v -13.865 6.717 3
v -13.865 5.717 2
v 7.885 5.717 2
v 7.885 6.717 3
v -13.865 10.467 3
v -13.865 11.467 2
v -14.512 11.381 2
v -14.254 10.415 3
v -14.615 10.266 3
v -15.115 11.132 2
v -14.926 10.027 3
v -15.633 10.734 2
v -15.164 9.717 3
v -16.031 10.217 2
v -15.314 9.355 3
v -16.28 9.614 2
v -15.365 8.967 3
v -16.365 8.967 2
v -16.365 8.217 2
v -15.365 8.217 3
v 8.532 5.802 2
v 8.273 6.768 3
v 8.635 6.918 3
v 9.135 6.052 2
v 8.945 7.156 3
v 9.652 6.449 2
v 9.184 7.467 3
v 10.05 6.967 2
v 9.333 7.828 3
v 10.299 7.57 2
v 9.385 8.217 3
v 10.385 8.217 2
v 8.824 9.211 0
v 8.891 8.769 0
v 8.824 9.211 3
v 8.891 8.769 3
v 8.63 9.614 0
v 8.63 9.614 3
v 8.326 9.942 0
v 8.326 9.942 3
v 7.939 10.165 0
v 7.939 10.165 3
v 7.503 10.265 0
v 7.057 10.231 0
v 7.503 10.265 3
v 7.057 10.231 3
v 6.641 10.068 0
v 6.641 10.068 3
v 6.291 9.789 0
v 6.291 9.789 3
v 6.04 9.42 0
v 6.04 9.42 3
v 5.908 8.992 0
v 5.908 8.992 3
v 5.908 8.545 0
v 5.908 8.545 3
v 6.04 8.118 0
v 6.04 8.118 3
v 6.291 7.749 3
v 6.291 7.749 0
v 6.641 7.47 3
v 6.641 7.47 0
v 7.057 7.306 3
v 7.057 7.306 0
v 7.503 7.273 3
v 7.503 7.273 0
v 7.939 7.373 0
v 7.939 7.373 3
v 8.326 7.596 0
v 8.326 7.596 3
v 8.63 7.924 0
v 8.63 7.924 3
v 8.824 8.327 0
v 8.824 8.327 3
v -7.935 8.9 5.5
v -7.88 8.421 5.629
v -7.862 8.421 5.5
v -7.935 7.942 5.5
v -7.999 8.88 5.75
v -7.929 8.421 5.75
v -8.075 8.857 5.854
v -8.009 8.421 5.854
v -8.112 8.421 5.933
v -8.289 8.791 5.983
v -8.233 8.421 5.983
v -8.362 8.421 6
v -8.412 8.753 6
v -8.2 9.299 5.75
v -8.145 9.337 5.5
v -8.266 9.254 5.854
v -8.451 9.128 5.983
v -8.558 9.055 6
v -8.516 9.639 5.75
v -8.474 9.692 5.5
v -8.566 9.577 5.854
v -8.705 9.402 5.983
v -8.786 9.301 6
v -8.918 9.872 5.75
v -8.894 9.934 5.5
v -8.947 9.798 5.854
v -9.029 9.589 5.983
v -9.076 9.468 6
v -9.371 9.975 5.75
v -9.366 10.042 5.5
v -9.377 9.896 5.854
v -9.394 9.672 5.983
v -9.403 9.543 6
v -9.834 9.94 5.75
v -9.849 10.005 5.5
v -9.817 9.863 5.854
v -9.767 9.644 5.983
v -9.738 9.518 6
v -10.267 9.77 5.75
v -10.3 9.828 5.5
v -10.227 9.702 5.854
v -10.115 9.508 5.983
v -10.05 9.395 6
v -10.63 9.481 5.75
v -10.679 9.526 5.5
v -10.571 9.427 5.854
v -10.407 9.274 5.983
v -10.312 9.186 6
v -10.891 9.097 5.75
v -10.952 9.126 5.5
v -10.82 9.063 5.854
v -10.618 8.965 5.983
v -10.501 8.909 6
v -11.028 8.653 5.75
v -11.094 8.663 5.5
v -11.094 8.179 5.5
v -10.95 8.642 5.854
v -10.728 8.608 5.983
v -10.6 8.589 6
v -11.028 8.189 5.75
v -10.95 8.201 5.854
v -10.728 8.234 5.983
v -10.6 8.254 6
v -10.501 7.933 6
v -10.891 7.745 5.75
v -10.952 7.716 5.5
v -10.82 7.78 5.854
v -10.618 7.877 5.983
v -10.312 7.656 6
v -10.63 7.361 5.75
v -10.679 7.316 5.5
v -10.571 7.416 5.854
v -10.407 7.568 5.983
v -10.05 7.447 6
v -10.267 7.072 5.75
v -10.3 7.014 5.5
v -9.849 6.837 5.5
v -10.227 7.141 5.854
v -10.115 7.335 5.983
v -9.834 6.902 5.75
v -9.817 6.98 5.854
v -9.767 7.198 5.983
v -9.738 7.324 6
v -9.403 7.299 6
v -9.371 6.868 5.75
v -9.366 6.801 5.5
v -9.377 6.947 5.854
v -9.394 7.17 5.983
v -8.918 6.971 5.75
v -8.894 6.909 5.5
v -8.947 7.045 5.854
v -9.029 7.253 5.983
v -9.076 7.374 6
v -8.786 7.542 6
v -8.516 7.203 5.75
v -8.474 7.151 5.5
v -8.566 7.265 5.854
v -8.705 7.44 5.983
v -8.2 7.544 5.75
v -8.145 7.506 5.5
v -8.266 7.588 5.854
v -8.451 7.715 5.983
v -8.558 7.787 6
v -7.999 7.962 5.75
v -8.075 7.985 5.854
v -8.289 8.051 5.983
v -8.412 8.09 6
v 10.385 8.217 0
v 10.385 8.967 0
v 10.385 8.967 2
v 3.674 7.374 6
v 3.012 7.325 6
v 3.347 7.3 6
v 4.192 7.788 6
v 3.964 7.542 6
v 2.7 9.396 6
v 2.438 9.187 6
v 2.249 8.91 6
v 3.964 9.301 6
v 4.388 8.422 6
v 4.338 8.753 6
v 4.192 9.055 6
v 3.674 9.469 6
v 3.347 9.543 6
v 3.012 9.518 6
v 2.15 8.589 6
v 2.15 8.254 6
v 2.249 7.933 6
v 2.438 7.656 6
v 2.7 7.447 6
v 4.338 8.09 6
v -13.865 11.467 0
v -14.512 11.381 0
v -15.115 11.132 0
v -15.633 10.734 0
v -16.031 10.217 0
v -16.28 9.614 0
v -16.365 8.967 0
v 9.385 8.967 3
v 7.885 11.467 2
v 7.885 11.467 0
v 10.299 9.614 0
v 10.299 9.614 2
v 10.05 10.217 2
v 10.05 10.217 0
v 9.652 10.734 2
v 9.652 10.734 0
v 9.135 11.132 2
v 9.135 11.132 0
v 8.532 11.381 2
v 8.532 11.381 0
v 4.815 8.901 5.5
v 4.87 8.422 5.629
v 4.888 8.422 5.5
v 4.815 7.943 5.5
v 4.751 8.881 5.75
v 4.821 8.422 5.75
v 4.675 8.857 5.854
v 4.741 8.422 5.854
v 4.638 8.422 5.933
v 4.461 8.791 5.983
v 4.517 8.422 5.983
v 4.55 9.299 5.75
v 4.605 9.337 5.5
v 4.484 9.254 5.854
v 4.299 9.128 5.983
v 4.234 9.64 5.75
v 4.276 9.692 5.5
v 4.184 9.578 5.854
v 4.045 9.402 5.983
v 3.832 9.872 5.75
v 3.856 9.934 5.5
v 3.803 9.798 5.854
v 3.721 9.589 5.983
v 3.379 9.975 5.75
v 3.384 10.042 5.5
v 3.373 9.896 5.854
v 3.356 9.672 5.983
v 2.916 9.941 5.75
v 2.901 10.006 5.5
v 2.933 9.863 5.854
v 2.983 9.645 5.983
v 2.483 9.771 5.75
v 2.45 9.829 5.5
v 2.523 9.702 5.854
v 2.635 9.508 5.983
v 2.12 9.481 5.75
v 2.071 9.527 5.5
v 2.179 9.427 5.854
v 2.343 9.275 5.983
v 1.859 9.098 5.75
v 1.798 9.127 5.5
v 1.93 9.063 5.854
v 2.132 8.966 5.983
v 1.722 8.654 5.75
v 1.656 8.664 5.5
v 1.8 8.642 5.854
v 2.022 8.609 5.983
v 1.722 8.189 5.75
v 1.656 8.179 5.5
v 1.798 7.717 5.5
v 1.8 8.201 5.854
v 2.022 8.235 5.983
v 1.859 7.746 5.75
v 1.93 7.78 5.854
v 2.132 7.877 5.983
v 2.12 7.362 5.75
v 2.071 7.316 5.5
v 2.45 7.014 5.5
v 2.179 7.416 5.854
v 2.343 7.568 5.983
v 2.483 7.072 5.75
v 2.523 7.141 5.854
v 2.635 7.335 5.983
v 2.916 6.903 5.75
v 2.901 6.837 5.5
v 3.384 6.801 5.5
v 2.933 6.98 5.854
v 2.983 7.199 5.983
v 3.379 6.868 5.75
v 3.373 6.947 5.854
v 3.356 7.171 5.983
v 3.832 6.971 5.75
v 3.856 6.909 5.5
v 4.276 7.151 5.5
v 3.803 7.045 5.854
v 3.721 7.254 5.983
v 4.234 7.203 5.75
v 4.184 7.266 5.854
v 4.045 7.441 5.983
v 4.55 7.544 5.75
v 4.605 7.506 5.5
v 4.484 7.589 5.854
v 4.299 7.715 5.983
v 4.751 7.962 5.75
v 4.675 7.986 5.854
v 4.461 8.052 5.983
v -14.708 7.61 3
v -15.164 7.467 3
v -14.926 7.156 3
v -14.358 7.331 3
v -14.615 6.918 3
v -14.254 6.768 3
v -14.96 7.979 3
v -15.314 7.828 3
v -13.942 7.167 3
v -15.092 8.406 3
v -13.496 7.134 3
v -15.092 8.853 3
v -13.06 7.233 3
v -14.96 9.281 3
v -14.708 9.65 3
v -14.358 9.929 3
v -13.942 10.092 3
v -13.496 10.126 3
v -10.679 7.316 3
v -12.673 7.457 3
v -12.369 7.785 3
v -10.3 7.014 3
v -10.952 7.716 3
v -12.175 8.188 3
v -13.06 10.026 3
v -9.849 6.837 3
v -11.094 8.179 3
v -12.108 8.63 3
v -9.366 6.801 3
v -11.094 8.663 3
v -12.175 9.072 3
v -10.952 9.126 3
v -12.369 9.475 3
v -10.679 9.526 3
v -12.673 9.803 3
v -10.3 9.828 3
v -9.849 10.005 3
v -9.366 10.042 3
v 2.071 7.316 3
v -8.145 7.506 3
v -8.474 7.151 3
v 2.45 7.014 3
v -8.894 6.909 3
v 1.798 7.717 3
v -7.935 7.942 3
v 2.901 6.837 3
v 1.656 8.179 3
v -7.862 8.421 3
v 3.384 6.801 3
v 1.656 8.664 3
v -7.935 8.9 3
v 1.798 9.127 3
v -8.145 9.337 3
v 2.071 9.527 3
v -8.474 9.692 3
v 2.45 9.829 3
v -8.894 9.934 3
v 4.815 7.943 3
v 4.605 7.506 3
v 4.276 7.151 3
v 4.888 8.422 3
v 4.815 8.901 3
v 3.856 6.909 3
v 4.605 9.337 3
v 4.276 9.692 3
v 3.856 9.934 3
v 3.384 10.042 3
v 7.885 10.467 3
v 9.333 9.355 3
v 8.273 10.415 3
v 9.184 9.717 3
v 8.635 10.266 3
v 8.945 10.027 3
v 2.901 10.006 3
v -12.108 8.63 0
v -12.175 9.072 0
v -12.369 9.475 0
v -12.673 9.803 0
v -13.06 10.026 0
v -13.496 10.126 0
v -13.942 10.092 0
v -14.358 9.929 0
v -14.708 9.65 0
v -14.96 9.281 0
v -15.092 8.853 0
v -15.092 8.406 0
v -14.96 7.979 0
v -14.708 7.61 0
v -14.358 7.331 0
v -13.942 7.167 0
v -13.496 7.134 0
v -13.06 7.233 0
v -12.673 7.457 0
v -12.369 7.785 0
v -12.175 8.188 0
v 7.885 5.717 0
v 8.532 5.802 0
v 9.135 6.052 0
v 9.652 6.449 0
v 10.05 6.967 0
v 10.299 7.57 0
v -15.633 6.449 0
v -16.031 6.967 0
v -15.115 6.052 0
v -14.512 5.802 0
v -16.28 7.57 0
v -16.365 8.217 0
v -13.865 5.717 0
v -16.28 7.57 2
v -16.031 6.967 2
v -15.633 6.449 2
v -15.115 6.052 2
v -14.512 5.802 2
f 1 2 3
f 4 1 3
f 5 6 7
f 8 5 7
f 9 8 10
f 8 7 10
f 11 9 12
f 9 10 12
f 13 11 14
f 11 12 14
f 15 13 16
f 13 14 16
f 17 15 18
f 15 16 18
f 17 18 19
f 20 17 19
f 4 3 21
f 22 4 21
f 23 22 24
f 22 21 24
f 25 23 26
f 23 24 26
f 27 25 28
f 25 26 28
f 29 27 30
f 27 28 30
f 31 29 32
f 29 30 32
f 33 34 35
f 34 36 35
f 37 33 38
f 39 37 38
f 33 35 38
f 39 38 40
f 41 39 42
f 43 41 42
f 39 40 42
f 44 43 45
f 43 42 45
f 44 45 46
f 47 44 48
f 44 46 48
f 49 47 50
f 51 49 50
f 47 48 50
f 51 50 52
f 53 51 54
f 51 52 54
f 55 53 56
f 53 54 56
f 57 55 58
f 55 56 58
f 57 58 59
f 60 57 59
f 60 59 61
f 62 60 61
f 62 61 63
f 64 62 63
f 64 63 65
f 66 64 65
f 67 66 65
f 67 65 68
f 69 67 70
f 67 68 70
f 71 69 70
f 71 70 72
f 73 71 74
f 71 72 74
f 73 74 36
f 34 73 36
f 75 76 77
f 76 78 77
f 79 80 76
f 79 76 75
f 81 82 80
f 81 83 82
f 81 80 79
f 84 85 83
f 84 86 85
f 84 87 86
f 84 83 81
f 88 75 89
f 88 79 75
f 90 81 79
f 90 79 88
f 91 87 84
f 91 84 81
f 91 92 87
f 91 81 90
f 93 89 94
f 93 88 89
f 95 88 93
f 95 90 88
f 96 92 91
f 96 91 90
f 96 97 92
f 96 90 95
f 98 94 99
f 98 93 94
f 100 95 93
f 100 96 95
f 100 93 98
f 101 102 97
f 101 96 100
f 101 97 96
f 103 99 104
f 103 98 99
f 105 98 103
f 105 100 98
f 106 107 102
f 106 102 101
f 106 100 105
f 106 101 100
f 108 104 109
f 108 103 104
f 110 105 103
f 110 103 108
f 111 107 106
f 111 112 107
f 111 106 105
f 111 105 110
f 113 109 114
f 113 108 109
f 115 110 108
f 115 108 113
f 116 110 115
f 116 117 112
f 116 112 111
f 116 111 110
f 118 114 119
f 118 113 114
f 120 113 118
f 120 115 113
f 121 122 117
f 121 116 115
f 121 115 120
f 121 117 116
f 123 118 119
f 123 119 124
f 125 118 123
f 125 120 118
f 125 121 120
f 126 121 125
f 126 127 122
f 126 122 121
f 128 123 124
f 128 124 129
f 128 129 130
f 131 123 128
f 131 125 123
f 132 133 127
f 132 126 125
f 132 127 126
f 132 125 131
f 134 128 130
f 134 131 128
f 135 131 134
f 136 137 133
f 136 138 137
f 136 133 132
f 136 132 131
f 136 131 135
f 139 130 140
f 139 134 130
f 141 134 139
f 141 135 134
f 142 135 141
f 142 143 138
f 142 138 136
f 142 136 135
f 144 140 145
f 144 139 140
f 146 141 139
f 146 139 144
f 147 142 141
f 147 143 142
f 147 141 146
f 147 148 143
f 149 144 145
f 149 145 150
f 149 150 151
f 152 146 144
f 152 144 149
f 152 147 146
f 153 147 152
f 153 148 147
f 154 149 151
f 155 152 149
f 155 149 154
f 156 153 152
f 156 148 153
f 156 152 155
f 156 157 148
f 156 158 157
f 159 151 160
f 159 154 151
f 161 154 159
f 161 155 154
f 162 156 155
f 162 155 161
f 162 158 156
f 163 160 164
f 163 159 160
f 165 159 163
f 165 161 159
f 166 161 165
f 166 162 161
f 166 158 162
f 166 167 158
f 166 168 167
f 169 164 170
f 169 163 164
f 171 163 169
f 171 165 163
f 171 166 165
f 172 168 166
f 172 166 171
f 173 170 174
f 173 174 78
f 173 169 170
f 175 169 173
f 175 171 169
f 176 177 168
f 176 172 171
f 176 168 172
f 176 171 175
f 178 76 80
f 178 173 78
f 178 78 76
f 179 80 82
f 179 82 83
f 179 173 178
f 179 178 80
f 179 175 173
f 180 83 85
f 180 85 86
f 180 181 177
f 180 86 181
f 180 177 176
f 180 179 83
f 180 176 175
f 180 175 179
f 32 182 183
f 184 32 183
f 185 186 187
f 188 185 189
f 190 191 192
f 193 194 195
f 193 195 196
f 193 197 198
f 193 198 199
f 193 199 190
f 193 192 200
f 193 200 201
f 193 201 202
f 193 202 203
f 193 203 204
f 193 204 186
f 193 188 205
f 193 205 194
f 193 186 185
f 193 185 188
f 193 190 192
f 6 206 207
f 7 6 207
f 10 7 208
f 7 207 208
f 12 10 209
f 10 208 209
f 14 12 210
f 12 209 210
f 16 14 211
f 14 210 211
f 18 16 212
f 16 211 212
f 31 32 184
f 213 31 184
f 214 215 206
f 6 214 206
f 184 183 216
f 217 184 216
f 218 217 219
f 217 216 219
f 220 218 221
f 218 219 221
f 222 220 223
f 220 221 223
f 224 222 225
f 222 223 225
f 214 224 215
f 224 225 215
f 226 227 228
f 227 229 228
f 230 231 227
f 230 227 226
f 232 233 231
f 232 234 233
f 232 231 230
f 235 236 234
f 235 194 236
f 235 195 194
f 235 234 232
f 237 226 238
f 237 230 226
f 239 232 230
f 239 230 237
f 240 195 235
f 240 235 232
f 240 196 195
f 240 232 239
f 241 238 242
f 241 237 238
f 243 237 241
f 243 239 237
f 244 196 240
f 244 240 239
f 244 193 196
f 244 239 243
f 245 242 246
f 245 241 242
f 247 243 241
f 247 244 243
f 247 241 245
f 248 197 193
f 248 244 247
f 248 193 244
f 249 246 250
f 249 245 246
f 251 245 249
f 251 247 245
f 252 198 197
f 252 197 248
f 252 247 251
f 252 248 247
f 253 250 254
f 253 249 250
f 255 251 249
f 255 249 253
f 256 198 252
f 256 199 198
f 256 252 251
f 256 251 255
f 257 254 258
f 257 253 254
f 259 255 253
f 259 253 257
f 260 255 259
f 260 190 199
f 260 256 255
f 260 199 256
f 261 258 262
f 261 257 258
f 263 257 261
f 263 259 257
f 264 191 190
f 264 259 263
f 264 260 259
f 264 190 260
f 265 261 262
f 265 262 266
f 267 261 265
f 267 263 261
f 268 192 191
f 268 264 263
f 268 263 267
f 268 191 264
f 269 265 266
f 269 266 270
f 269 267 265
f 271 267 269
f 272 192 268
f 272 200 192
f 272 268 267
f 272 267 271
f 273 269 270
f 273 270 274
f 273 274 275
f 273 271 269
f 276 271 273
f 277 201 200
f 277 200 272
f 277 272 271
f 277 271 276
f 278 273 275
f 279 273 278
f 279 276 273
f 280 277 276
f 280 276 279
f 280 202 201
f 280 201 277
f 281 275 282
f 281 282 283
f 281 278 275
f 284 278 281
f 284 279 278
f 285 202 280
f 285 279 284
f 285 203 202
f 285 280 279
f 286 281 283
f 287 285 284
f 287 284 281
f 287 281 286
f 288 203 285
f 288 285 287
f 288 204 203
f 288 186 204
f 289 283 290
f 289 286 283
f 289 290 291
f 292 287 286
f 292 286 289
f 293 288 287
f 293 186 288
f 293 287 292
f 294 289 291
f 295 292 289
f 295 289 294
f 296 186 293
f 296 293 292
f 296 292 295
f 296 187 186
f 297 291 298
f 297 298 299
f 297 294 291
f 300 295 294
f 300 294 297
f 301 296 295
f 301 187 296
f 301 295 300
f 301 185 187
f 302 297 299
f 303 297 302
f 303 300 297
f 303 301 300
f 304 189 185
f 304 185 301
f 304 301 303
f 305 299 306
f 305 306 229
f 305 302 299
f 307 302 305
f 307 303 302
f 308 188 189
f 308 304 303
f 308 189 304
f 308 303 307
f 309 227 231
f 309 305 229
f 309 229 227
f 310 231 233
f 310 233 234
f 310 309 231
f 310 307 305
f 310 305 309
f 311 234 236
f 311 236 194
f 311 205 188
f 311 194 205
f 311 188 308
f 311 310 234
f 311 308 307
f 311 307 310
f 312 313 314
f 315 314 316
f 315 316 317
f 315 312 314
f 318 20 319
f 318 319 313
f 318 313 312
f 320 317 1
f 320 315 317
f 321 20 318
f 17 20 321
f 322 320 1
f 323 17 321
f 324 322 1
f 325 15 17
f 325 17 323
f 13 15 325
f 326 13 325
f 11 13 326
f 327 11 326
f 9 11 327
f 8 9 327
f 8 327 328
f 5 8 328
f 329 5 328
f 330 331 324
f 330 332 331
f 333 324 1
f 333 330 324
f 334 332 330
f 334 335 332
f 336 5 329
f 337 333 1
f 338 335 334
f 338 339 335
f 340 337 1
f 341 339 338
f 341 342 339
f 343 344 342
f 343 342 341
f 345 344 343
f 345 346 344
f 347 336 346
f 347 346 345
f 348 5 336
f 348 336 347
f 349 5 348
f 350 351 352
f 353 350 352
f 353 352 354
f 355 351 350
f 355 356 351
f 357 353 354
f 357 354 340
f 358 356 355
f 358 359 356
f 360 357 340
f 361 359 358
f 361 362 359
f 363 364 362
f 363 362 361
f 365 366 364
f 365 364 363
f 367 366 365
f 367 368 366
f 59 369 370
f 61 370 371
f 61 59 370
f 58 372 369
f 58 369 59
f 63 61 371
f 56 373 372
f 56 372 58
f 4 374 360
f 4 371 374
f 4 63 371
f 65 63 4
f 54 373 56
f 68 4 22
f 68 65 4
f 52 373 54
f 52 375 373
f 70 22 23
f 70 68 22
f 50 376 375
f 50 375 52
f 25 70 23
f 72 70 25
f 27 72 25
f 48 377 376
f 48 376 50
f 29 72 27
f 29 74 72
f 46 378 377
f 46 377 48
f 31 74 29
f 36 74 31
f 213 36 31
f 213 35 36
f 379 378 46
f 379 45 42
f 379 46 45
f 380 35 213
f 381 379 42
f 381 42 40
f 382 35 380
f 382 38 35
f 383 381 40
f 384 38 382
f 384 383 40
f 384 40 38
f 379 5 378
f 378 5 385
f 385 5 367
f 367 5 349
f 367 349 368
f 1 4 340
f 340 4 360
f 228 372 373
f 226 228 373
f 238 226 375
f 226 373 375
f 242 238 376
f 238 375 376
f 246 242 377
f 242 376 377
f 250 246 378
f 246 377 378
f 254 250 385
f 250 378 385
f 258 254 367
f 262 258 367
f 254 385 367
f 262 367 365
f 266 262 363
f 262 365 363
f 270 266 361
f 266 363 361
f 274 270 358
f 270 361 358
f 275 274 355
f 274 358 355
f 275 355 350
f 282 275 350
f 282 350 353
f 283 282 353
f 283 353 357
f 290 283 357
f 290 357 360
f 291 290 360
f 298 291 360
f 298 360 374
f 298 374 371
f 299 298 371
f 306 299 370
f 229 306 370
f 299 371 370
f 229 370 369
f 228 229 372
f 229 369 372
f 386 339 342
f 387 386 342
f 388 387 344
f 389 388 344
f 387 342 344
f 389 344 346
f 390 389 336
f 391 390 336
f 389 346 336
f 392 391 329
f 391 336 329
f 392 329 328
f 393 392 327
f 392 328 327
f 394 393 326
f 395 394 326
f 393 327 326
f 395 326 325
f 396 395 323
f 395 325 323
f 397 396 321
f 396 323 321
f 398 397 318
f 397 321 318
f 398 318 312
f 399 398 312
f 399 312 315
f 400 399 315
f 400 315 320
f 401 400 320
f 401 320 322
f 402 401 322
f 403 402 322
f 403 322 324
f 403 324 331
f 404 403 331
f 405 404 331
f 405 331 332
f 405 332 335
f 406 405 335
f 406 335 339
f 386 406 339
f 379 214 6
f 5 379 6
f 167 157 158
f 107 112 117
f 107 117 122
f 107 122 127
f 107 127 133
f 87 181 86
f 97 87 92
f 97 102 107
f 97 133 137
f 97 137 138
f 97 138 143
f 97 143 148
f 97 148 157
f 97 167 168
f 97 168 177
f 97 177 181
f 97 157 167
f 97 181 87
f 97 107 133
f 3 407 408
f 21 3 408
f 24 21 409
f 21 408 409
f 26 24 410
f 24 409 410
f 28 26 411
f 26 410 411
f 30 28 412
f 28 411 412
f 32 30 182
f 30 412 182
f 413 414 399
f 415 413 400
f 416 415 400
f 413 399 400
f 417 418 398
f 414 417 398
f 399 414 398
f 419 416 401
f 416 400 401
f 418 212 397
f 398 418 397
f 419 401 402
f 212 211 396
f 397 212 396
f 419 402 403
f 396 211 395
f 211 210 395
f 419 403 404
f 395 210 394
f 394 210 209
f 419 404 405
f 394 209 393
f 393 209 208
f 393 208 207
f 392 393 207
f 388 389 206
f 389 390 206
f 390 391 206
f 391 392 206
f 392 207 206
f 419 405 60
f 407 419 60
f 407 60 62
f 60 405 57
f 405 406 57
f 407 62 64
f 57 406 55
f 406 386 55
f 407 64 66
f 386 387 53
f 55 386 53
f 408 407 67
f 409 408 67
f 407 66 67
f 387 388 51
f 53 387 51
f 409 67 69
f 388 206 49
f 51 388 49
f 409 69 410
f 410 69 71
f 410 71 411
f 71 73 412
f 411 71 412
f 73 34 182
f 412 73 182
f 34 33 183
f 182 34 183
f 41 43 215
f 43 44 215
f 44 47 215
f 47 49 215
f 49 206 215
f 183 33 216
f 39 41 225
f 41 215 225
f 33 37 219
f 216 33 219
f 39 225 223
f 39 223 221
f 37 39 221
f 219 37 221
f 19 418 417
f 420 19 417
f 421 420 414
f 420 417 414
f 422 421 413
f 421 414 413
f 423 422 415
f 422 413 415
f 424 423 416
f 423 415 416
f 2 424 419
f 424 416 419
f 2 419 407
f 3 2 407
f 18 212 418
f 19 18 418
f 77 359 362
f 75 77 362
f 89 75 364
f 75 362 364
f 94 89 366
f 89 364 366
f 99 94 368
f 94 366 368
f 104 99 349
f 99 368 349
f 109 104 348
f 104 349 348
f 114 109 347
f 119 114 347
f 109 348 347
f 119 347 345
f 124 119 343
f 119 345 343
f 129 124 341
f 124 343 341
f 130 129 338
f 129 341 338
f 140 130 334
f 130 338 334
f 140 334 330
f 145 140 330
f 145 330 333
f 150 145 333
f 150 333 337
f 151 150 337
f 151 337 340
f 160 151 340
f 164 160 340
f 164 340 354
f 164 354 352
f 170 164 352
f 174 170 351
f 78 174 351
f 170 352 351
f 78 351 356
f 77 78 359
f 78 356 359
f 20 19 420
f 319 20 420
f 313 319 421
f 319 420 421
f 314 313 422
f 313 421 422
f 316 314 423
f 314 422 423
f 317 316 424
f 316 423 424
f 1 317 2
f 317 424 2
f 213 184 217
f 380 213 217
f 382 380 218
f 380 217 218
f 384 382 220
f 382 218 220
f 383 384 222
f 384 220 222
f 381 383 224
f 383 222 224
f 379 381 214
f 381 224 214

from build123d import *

# Parameters (mm, degrees)
F1_DEPTH = 3
F2_R     = 1.625
F3_DEPTH = 3
F2_R_2   = 1.5
F4_DEPTH = 12.5
F5_R     = 0.5
F6_SIZE  = 1


with BuildPart() as f1:
    # F0 (on Top) → F1 (new body)
    with BuildSketch(Plane.XY):
        with BuildLine():
            Line((7.884551, 11.466584), (-13.865449, 11.466584))
            ThreePointArc((-13.865449, 11.466584), (-15.633216, 10.734351), (-16.365449, 8.966584))
            Line((-16.365449, 8.966584), (-16.365449, 8.216584))
            ThreePointArc((-16.365449, 8.216584), (-15.633216, 6.448817), (-13.865449, 5.716584))
            Line((-13.865449, 5.716584), (7.884551, 5.716584))
            ThreePointArc((7.884551, 5.716584), (9.652318, 6.448817), (10.384551, 8.216584))
            Line((10.384551, 8.216584), (10.384551, 8.966584))
            ThreePointArc((10.384551, 8.966584), (9.652318, 10.734351), (7.884551, 11.466584))
        make_face()
    extrude(amount=F1_DEPTH)

    # F2 (on face) → F3 (join)
    with BuildSketch(Plane.XY.offset(3)):
        with Locations((-9.487499, 8.421189)):
            Circle(F2_R)
        with Locations((3.262501, 8.421584)):
            Circle(F2_R)
    extrude(amount=F3_DEPTH)

    # F2 (on face) → F4 (cut, symmetric)
    with BuildSketch(Plane.XY.offset(3)):
        with Locations((-13.608467, 8.629762)):
            Circle(F2_R_2)
        with Locations((7.391072, 8.768888)):
            Circle(F2_R_2)
    extrude(amount=F4_DEPTH, both=True, mode=Mode.SUBTRACT)

    # F5
    f5_edges = [f1.edges().sort_by_distance(p)[0] for p in [
        (1.637501, 8.421584, 6),
        (-11.112499, 8.421189, 6),
    ]]
    fillet(f5_edges, radius=F5_R)

    # F6
    f6_edges = [f1.edges().sort_by_distance(p)[0] for p in [
        (-2.990449, 11.466584, 3),
        (9.652318, 10.734351, 3),
        (-15.633216, 10.734351, 3),
        (10.384551, 8.591584, 3),
        (9.652318, 6.448817, 3),
        (-2.990449, 5.716584, 3),
        (-16.365449, 8.591584, 3),
        (-15.633216, 6.448817, 3),
    ]]
    chamfer(f6_edges, length=F6_SIZE)


solid = f1.part
